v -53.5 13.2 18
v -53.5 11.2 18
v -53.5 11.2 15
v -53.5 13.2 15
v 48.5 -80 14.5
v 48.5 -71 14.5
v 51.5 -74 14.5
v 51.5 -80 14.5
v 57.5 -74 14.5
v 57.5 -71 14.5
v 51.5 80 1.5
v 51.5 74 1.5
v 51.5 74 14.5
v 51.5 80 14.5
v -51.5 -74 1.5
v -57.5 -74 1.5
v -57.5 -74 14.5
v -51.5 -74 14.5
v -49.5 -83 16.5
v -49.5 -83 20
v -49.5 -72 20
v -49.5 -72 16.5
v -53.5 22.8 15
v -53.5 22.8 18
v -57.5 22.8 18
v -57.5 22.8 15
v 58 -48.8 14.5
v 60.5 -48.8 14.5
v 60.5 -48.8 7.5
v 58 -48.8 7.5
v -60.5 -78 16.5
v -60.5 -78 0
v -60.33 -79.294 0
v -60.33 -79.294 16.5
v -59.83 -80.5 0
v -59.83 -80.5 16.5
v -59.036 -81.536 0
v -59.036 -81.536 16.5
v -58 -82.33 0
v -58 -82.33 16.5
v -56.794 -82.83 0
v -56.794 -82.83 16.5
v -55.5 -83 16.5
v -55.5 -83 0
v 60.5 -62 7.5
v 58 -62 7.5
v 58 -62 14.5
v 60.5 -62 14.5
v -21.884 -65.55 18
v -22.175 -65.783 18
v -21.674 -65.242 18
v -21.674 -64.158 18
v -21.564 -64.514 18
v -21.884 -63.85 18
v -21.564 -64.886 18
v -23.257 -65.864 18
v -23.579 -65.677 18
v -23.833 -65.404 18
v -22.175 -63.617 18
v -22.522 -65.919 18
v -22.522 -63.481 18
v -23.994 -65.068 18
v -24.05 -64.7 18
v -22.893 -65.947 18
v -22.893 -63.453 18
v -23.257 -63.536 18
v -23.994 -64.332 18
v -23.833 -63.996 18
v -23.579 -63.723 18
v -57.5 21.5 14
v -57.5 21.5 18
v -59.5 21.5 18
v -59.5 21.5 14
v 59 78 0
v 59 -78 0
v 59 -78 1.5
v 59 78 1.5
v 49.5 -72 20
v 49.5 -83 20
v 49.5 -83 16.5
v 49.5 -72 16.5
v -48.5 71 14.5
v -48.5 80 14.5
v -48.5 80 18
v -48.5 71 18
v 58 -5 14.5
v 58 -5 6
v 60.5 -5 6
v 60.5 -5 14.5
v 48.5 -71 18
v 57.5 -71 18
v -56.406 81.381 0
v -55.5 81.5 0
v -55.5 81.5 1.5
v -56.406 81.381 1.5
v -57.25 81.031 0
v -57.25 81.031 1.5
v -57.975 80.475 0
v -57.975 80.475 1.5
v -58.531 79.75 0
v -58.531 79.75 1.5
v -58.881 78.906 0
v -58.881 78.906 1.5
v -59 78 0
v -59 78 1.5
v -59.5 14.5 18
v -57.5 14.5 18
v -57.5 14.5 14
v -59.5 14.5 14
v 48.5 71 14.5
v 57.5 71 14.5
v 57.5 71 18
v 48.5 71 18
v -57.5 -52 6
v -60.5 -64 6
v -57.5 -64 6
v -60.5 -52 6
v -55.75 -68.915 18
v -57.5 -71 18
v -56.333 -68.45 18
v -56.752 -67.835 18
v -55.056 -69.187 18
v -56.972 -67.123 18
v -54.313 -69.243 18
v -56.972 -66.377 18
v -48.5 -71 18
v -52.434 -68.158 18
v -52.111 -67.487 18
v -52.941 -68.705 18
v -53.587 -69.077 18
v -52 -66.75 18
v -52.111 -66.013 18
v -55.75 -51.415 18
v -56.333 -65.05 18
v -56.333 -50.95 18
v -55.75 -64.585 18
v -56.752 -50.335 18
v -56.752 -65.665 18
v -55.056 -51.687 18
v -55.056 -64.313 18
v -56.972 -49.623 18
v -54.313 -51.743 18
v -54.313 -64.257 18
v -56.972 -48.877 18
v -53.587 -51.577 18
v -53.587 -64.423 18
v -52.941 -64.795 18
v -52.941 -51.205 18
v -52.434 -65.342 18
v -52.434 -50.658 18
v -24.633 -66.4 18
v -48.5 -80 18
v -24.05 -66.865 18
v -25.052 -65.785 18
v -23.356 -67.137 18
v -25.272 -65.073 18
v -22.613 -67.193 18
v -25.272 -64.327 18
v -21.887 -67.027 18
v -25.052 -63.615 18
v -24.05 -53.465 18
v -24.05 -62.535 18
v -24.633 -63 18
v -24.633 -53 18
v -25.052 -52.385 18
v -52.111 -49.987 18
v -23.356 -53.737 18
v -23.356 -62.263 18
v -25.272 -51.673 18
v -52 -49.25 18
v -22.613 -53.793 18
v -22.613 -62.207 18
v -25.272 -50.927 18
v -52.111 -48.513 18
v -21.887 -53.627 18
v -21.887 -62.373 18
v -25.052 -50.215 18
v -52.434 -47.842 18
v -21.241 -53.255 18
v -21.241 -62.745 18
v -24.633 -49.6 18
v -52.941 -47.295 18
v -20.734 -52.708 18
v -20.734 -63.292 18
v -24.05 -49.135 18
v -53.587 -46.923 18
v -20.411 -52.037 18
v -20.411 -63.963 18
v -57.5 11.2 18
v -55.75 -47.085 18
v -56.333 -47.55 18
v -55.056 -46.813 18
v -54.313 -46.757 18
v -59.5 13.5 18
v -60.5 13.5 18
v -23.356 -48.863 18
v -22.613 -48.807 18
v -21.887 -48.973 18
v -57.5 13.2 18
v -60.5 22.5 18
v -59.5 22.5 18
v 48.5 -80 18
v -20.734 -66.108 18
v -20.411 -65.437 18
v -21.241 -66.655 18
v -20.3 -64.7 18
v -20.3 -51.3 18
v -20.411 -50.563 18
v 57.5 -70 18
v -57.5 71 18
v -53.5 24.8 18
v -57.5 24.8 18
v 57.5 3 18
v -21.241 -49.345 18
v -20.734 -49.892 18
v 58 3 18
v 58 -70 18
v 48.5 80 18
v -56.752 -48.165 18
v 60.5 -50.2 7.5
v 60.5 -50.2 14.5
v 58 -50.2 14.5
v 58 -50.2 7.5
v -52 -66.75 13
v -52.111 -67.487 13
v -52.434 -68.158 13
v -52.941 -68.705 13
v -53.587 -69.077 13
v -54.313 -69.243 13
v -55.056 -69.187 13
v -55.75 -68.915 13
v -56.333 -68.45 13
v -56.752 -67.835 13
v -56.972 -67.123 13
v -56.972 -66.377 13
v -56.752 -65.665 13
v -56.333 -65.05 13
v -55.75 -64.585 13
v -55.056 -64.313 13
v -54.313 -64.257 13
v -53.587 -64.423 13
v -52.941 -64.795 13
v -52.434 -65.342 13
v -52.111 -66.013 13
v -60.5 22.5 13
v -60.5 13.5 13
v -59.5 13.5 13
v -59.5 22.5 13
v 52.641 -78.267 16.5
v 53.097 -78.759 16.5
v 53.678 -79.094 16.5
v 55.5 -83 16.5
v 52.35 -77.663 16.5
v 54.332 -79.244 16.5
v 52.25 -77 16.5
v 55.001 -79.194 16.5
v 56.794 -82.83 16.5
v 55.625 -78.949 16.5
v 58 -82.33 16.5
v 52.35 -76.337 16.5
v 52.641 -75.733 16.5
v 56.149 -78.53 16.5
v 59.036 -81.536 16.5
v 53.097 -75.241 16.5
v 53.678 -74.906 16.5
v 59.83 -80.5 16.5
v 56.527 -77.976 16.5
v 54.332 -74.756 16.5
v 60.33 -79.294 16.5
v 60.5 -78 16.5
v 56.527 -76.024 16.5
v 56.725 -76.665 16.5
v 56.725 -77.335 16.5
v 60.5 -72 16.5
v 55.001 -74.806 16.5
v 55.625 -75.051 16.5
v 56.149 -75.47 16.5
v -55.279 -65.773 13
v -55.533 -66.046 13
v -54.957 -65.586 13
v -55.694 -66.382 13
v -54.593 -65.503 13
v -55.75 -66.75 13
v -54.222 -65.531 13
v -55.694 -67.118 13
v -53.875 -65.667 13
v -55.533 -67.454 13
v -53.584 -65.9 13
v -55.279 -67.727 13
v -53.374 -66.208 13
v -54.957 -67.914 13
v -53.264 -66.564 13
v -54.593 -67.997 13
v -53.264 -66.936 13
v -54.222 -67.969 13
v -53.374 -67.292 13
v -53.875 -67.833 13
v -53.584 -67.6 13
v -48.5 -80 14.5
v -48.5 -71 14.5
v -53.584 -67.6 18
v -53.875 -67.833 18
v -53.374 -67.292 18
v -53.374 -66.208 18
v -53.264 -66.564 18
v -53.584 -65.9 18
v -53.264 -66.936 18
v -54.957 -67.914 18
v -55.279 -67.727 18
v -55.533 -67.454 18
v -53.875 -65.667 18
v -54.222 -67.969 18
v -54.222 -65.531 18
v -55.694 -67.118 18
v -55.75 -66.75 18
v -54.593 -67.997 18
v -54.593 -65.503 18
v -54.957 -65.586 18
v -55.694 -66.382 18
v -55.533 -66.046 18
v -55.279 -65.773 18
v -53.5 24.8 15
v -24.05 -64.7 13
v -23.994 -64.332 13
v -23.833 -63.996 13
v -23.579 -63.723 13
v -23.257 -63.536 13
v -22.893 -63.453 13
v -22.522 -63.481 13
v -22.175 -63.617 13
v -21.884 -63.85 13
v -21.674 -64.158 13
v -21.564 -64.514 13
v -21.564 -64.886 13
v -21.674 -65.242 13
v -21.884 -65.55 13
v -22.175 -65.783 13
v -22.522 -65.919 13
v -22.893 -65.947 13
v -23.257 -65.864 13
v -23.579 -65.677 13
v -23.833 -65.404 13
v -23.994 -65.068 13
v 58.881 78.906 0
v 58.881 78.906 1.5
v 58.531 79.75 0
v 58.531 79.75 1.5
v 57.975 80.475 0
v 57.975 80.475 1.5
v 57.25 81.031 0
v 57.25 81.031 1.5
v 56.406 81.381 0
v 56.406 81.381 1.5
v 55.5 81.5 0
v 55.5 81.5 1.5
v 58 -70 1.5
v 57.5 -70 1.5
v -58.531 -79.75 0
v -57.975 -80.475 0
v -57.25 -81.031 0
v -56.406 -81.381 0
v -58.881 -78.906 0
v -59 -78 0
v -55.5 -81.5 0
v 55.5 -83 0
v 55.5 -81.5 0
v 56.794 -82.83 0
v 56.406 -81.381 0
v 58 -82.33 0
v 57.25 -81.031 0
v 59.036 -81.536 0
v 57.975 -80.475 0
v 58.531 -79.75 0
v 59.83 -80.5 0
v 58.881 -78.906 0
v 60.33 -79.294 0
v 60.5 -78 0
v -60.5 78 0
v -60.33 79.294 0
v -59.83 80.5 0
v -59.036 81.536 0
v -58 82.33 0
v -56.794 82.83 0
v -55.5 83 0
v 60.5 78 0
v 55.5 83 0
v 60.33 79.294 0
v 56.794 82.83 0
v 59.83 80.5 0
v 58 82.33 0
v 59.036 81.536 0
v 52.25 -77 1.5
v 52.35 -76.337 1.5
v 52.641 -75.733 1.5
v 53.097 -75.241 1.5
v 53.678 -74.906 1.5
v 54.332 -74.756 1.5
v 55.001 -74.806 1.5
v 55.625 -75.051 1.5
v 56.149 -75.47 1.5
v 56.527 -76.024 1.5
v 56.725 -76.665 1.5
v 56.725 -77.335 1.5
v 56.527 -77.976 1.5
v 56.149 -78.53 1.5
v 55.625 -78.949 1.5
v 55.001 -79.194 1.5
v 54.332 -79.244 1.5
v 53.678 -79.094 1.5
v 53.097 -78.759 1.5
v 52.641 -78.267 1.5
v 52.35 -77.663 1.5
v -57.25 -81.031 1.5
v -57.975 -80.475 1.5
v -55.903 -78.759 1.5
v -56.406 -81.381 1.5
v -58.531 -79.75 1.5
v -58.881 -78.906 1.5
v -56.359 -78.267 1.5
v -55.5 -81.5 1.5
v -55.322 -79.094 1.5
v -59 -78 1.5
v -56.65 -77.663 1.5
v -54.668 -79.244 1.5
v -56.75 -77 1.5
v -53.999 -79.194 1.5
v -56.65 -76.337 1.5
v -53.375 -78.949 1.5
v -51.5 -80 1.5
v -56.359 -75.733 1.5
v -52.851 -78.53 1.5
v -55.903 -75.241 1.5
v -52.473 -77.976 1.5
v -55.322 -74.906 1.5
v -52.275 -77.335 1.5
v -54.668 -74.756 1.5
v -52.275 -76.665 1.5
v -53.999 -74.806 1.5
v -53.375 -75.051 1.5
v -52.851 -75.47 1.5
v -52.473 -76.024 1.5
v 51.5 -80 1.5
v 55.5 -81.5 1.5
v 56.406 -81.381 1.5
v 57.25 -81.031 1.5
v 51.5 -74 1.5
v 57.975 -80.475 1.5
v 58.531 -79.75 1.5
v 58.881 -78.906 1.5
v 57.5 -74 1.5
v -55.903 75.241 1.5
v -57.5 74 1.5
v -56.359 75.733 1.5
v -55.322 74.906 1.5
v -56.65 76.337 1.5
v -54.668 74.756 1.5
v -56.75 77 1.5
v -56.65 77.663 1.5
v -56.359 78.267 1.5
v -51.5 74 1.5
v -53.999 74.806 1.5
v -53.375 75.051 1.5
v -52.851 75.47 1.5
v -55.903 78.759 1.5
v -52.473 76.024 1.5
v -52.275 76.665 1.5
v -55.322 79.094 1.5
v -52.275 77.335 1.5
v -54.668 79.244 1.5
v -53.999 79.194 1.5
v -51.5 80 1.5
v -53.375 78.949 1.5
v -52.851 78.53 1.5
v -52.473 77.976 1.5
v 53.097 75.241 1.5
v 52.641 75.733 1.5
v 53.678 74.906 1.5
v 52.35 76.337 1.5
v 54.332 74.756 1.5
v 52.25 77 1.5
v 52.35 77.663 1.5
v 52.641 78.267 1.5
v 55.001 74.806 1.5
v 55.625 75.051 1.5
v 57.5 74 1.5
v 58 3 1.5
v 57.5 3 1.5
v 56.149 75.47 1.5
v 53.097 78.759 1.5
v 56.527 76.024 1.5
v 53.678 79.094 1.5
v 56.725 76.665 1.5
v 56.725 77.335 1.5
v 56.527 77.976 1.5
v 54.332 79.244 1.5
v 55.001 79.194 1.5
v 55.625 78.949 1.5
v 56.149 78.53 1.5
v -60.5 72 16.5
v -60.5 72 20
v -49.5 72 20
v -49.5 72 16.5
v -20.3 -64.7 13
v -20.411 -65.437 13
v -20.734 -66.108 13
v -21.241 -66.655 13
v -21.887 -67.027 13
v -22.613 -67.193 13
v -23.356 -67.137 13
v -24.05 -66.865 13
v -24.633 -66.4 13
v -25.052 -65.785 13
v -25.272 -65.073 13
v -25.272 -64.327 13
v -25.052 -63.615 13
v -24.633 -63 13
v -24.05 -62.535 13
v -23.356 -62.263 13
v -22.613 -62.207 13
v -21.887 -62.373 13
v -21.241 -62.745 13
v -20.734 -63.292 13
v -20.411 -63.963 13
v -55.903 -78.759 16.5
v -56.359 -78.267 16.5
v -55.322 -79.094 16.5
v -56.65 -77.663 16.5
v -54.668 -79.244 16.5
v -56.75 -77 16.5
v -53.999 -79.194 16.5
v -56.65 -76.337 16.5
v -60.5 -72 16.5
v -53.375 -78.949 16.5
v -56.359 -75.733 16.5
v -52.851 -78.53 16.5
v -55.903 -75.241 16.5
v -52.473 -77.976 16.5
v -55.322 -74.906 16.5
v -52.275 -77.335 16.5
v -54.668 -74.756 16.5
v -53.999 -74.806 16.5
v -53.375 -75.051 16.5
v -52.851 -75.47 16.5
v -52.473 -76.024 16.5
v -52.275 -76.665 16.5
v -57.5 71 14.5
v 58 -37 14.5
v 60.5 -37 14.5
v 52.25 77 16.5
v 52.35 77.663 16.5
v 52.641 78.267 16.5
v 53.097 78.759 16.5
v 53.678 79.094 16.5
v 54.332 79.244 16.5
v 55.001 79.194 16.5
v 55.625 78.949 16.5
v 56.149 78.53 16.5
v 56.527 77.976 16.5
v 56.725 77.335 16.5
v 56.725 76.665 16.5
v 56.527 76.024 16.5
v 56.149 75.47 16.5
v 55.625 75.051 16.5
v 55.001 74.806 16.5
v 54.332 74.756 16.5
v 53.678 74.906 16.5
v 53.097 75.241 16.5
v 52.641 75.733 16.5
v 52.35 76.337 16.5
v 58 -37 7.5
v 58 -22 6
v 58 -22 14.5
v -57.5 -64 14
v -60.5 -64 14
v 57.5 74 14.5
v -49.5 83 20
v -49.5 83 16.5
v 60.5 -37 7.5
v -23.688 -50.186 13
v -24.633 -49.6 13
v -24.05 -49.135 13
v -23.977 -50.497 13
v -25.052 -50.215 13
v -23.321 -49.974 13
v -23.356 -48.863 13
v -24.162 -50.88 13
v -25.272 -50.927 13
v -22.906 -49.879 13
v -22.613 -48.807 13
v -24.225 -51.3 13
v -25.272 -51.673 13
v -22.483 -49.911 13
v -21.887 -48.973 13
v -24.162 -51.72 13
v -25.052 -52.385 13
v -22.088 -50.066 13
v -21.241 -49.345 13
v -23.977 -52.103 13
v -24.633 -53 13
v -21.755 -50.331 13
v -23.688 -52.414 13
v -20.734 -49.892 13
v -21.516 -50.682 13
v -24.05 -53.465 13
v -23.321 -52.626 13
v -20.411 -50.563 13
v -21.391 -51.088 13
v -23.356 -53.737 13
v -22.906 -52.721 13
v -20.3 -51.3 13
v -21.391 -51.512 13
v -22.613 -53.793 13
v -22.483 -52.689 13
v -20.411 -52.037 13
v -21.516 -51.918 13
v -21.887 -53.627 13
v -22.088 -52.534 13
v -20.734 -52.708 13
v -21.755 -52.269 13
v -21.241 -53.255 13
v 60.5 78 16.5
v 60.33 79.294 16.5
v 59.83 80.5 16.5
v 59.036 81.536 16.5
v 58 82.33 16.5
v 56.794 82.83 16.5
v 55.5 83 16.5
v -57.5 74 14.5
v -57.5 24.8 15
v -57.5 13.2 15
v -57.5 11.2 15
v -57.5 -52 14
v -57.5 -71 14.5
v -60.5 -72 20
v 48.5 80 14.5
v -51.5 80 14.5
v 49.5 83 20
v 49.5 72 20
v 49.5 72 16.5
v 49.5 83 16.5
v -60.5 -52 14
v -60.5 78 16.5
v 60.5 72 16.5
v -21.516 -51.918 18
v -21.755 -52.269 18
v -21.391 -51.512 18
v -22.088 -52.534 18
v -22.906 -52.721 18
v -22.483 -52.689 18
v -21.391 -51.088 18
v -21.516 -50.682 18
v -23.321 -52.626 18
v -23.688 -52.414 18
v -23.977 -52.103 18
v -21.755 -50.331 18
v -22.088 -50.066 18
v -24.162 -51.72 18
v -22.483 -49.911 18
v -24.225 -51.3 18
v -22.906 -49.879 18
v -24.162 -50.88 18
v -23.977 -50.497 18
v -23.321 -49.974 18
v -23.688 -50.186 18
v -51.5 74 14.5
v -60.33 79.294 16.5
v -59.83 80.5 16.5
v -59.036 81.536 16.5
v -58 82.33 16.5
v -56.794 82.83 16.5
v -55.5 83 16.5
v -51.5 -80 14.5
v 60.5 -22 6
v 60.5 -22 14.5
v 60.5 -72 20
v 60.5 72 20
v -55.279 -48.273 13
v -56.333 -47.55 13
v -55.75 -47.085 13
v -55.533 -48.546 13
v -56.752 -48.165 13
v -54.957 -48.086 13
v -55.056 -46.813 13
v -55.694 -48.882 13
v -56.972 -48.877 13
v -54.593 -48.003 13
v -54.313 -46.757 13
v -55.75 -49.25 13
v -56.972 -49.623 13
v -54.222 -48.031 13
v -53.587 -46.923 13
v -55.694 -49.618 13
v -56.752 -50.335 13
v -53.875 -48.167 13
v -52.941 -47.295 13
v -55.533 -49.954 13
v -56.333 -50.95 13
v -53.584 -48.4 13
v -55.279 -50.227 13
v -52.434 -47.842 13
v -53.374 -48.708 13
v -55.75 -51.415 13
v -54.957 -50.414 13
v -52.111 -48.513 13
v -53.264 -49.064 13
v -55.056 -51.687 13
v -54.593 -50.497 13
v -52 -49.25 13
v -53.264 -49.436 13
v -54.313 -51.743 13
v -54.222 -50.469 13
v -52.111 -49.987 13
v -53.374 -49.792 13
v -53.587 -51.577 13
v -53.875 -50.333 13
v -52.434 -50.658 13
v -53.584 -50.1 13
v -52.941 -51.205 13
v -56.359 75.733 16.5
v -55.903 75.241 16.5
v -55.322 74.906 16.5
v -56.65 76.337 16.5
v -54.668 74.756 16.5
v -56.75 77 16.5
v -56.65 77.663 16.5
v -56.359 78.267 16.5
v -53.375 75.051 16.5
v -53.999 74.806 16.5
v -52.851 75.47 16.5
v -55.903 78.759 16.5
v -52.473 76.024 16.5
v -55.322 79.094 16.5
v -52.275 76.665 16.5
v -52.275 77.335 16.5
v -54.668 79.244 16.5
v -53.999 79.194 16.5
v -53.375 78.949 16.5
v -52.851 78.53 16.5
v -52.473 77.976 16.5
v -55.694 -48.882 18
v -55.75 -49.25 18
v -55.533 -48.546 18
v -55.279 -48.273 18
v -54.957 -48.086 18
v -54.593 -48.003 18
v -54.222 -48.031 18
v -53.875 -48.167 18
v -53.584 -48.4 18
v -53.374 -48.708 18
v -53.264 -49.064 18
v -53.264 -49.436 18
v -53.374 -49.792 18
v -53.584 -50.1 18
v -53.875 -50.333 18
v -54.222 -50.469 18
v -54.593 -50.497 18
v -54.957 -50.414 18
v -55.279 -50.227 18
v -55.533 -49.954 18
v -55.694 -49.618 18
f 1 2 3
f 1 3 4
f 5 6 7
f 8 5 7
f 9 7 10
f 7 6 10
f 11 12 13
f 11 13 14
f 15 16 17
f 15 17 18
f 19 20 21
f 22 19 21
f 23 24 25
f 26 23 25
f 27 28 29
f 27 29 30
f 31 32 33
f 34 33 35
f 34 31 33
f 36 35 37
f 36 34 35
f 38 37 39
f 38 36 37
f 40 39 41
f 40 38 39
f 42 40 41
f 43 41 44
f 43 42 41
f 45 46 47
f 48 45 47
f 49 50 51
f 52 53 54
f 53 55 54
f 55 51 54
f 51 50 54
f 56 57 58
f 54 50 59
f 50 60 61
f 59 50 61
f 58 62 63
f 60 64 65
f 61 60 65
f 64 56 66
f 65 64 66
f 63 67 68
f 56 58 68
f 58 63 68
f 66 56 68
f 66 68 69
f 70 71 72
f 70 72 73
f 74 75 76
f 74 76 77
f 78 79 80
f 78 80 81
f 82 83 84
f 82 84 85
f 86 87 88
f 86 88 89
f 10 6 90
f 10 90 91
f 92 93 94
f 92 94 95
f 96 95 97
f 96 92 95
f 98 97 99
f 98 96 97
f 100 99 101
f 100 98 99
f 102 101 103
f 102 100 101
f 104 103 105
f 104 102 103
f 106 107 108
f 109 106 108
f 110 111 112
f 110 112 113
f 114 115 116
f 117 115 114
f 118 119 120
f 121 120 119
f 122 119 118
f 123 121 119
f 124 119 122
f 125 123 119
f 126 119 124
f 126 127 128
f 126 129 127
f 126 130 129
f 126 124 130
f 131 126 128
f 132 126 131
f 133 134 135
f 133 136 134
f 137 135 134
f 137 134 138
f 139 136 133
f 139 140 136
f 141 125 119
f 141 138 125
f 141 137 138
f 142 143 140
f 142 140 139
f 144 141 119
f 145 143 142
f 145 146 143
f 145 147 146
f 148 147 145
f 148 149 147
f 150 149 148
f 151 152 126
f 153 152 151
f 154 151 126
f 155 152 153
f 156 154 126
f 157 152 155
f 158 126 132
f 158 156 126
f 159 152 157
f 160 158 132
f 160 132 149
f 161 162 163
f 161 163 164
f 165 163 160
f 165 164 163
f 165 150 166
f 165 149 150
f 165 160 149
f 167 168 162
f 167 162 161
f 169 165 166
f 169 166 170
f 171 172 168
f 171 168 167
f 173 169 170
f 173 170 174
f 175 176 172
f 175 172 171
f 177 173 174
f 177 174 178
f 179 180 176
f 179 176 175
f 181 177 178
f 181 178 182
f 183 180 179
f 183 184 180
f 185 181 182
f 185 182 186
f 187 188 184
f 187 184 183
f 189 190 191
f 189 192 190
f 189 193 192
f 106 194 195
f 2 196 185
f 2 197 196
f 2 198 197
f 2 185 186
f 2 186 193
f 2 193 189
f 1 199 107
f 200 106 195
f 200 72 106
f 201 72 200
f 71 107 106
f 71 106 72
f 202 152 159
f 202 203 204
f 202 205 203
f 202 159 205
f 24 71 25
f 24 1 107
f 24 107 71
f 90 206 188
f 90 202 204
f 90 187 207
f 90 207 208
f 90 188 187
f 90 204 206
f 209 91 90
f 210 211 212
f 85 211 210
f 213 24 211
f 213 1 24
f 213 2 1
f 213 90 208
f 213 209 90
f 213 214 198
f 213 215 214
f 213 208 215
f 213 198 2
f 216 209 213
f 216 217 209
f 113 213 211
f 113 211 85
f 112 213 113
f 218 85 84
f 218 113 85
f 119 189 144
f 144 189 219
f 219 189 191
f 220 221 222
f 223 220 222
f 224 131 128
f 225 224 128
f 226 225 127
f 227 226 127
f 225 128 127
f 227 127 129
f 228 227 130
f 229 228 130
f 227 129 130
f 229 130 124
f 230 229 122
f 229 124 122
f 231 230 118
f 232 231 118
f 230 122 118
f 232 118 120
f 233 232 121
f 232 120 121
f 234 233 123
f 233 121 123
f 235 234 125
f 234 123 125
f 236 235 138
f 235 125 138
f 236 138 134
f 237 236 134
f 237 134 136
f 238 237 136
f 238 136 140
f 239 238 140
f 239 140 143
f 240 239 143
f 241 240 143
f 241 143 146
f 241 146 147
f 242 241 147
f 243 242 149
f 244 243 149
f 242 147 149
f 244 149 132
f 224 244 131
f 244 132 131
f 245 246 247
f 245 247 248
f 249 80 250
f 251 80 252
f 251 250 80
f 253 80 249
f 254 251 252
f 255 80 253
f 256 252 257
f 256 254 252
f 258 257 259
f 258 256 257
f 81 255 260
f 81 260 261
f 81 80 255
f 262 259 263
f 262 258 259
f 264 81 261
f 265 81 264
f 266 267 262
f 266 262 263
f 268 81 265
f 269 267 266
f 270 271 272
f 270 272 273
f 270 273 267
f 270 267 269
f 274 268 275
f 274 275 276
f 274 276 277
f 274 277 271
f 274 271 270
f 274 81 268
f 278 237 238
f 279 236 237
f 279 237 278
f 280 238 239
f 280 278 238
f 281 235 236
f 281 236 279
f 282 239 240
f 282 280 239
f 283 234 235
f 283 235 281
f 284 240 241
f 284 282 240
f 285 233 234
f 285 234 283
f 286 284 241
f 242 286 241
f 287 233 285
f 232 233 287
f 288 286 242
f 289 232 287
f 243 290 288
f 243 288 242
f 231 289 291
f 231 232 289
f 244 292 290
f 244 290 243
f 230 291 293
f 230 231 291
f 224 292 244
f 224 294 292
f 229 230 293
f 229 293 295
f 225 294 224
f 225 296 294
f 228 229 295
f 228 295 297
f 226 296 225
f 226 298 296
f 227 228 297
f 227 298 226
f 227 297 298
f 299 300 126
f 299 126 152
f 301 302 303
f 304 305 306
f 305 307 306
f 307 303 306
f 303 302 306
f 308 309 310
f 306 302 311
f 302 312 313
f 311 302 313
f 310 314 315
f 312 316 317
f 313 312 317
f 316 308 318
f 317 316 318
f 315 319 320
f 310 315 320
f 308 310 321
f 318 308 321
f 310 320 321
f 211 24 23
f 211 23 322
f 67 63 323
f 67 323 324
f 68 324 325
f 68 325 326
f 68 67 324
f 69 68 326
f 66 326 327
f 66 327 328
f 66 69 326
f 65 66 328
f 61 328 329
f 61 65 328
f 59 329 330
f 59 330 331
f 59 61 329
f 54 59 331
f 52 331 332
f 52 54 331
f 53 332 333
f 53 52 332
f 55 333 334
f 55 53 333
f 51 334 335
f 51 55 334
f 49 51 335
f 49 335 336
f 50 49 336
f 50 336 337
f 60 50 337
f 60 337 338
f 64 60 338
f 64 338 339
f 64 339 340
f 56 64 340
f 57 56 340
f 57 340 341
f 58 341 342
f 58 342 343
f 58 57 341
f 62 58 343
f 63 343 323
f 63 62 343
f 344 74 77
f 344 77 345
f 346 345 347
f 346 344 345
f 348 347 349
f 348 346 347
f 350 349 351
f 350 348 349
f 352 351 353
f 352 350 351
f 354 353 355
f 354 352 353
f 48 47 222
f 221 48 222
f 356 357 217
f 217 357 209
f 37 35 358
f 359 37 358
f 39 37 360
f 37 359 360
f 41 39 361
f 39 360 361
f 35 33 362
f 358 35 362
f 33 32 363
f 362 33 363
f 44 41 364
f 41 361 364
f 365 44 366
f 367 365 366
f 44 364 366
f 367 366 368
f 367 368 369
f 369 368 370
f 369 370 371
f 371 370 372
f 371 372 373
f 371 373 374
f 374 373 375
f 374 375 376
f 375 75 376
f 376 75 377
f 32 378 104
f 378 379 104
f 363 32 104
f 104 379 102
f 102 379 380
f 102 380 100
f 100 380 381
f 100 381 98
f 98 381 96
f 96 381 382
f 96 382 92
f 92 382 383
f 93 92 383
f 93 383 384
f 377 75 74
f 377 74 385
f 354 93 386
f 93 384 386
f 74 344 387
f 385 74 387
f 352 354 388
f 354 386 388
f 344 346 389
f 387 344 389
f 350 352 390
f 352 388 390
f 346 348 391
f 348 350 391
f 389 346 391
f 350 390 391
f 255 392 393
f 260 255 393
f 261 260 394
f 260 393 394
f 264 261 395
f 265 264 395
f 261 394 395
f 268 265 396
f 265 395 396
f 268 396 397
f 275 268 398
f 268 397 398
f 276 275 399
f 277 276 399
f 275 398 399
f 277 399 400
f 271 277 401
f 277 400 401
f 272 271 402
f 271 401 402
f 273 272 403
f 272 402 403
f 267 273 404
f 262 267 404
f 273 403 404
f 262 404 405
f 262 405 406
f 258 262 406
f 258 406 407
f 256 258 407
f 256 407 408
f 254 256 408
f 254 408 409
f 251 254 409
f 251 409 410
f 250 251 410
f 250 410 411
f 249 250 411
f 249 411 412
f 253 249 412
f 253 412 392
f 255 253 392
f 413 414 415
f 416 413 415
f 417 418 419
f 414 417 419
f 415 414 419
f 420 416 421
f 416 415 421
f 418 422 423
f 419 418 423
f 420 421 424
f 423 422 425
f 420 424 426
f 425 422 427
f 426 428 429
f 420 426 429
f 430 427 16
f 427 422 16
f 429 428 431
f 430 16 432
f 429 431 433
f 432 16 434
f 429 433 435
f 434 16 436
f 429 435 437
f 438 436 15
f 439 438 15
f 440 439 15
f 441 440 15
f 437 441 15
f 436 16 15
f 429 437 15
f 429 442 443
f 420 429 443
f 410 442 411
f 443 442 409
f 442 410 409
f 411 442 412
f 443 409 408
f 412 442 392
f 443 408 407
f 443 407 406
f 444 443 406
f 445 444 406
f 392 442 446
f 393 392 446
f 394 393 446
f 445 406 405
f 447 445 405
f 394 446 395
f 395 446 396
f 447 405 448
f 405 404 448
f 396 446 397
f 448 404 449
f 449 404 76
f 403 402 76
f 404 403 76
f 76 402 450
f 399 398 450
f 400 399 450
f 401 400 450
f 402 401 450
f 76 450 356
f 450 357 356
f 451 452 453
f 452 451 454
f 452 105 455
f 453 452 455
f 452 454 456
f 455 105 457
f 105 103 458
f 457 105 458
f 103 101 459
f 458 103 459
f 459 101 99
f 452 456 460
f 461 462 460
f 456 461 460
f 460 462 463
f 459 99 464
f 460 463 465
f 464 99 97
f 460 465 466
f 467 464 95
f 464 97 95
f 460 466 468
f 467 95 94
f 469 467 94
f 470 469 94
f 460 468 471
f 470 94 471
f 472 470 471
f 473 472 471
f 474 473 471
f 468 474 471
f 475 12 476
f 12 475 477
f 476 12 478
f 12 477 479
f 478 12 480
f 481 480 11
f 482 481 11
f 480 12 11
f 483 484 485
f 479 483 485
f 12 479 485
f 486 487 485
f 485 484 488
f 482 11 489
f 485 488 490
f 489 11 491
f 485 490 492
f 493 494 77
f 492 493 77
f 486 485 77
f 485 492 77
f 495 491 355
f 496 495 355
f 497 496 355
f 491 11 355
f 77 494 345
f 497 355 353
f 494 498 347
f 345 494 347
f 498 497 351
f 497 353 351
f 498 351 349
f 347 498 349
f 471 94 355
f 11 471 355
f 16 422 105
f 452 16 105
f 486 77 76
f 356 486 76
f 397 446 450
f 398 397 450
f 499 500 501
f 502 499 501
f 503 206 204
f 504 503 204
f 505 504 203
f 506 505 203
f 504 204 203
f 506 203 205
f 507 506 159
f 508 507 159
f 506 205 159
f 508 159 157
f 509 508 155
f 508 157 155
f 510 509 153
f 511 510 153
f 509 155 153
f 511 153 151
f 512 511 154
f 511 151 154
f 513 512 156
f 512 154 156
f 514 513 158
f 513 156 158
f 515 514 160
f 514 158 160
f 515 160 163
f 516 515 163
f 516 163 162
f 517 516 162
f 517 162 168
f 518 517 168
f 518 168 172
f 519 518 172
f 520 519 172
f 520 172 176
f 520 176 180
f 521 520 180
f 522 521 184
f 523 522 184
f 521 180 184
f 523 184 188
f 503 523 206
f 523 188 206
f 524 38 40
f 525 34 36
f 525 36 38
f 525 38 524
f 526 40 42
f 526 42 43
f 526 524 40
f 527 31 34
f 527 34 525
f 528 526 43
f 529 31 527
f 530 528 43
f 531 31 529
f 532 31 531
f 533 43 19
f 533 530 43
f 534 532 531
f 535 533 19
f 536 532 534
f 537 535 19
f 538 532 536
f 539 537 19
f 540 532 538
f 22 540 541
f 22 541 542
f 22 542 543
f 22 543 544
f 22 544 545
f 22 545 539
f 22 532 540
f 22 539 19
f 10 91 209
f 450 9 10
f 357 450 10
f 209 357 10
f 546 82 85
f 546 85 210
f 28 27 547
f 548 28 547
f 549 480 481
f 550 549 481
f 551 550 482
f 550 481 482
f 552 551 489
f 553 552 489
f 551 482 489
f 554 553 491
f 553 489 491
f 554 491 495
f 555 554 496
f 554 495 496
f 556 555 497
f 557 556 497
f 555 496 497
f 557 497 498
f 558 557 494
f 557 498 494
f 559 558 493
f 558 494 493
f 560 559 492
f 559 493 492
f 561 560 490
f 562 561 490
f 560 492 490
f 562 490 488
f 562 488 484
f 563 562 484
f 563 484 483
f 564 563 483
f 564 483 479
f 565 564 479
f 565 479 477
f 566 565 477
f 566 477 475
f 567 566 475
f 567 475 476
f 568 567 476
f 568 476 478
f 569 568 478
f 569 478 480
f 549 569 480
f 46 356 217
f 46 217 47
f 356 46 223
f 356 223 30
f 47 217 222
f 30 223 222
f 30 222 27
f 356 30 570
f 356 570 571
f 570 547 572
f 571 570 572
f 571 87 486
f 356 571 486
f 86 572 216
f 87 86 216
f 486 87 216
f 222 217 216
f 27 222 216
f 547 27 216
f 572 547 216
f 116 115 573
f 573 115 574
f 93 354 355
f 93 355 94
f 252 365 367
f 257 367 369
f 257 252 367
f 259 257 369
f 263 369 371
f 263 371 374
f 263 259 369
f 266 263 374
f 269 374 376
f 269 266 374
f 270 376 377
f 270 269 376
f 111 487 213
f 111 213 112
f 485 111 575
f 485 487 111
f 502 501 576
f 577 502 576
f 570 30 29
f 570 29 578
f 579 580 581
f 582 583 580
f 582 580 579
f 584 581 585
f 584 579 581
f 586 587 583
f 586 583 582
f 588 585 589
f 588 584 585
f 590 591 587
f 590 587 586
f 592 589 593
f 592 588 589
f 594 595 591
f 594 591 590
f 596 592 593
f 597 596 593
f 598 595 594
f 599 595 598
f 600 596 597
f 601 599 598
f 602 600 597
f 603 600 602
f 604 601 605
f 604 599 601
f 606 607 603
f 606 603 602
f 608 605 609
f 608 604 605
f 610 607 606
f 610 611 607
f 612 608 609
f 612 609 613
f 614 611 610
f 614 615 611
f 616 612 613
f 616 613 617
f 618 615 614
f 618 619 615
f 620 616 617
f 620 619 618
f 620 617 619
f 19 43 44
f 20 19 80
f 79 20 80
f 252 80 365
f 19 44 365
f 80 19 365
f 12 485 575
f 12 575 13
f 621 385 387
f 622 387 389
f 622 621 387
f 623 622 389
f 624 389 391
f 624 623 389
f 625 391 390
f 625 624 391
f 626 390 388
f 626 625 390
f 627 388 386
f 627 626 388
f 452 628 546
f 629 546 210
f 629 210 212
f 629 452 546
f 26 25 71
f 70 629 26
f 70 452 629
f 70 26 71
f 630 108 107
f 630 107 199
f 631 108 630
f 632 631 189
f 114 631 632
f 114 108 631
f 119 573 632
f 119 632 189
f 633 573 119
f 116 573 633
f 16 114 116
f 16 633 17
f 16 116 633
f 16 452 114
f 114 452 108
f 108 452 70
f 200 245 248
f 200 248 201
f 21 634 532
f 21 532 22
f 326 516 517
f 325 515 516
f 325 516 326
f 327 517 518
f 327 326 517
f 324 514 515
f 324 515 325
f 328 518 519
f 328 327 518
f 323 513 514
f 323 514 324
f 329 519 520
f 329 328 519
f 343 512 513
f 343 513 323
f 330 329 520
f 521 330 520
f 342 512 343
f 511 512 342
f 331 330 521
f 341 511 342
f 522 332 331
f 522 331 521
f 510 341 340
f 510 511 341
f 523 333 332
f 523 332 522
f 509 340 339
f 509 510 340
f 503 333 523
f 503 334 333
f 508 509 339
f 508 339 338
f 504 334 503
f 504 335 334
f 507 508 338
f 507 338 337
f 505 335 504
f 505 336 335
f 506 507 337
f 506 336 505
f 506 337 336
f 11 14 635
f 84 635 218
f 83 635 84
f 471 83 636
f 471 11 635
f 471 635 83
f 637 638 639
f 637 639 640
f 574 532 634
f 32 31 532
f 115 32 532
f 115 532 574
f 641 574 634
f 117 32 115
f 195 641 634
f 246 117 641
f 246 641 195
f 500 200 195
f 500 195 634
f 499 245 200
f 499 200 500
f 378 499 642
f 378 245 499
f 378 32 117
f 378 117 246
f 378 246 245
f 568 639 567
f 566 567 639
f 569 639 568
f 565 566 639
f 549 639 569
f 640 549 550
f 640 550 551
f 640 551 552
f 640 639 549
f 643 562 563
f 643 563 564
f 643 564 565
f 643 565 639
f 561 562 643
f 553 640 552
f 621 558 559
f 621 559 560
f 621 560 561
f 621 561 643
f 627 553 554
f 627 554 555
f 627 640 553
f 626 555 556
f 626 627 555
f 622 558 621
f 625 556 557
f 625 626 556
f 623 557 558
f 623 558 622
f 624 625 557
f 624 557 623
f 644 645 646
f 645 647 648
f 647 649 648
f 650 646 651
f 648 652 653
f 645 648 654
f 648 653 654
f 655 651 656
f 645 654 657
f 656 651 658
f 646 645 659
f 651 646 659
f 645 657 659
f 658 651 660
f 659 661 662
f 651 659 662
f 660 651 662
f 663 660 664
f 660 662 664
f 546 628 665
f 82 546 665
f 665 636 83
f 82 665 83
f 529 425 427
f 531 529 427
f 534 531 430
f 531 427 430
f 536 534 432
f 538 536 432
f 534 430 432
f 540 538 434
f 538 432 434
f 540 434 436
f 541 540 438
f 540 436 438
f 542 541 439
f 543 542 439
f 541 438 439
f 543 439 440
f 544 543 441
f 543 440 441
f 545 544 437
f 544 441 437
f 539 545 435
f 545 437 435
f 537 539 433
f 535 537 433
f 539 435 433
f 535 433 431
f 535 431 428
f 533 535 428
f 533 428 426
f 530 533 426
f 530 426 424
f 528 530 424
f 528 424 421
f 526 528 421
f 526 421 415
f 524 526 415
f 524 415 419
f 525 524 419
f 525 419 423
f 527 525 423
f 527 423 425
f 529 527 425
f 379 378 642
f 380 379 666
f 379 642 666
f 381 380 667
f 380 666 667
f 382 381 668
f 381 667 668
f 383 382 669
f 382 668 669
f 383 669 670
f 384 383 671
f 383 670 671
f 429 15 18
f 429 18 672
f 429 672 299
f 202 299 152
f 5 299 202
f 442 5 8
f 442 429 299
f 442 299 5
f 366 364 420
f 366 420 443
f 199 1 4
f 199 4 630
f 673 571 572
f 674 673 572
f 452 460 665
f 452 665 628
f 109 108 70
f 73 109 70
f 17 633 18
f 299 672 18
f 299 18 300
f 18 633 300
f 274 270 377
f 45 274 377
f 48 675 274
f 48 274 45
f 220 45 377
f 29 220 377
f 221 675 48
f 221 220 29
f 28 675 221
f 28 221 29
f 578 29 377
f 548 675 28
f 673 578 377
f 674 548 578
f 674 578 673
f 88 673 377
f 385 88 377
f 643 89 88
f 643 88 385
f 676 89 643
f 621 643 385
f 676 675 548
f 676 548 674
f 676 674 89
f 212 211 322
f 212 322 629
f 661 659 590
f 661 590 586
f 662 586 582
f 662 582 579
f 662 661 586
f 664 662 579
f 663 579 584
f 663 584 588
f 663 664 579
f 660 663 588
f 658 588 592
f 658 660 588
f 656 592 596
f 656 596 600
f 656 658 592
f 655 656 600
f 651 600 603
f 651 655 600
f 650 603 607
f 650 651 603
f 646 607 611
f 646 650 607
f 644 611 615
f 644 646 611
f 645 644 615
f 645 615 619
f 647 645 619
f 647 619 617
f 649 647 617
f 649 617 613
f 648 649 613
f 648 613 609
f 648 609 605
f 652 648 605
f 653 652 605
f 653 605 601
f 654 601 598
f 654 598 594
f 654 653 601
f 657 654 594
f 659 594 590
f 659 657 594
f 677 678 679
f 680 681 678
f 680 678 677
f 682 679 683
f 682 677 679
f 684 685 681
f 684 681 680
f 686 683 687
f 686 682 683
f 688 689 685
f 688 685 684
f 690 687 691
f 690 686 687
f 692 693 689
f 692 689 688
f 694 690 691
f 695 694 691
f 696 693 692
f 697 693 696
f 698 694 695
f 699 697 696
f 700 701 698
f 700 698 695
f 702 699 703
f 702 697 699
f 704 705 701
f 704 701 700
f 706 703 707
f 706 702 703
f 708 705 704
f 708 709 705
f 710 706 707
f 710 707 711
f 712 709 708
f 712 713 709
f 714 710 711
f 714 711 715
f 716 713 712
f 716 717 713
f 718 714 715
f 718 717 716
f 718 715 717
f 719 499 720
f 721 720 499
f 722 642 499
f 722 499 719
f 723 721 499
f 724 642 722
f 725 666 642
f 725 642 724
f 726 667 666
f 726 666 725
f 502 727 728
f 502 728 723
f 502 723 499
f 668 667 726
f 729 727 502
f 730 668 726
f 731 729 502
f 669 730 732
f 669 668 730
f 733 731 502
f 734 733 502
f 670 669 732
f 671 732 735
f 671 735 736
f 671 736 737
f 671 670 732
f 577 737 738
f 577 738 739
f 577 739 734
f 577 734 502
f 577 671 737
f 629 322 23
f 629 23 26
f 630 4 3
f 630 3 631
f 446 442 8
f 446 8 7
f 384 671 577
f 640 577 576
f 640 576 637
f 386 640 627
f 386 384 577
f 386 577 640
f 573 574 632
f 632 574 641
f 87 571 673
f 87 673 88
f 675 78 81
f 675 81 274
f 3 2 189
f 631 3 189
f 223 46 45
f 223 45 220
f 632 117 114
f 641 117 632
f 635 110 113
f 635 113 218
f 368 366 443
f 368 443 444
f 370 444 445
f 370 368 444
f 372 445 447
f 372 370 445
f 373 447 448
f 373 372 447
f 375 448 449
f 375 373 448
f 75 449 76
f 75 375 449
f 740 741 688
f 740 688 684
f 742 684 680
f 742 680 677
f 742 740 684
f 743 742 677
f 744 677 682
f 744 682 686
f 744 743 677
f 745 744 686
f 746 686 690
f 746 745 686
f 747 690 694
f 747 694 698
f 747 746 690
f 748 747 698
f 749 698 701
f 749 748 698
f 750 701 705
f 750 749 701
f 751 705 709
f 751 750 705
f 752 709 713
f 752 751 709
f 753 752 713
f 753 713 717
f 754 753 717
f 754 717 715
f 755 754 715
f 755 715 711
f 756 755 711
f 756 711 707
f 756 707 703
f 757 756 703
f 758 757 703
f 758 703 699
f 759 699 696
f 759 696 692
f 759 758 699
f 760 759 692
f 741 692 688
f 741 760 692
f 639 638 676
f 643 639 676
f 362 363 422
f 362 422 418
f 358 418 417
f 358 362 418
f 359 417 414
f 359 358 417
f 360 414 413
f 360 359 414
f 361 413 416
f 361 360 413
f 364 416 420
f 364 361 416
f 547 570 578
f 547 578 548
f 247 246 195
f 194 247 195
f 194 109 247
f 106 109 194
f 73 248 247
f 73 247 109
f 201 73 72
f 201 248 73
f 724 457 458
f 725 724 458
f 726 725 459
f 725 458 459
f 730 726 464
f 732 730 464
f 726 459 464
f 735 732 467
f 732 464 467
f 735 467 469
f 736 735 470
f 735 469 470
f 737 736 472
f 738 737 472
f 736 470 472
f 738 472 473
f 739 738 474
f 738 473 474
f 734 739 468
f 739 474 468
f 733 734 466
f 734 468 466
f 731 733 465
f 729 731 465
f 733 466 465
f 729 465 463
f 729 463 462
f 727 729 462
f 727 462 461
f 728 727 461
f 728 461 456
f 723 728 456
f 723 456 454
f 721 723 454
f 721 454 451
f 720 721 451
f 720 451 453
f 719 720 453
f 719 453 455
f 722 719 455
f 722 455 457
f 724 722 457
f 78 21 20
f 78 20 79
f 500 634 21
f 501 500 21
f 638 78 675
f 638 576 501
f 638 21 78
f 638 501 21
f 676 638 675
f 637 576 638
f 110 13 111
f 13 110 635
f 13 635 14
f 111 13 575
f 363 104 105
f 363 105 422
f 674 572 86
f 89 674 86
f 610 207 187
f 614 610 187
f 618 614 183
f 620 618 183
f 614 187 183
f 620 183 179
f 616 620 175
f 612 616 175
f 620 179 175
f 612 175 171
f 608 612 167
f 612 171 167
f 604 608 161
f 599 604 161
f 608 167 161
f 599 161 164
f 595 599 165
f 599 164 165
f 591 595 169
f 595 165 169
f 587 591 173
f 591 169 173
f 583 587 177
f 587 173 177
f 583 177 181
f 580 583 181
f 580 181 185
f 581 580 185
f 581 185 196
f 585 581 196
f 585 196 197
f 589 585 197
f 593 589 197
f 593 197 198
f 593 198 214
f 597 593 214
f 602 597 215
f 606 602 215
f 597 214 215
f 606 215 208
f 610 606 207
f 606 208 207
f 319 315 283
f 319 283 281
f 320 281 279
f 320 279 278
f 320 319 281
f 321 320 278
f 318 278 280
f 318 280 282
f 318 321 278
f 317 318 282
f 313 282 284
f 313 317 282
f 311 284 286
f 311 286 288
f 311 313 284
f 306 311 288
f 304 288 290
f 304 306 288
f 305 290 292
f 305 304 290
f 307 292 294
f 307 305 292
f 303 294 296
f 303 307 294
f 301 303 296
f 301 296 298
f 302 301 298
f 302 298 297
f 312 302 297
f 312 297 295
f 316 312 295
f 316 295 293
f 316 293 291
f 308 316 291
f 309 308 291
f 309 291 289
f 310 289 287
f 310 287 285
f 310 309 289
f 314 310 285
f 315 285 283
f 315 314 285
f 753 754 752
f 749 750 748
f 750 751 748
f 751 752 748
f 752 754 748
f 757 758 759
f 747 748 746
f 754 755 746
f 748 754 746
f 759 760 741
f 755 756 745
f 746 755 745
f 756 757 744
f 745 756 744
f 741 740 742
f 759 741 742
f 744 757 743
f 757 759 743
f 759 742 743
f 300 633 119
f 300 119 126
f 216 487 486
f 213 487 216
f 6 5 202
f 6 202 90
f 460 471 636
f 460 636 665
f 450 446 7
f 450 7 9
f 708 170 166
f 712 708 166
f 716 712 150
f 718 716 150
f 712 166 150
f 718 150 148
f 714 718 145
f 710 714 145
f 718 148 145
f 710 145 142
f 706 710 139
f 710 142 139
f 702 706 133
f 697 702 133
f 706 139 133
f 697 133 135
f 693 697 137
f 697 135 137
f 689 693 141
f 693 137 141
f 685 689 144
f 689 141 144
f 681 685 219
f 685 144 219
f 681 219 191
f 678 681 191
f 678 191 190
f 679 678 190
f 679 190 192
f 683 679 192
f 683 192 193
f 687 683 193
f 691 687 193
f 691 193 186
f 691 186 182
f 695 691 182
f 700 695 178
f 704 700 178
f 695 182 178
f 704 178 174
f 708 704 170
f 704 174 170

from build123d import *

# Parameters (mm, degrees)
SCHIZZO1_W                   = 121
SCHIZZO1_H                   = 166
ESTRUSIONE_ESTRUSIONE1_DEPTH = 20
RACCORDO1_R                  = 5
TAGLIO_ESTRUSIONE1_DEPTH     = 14.5
SCHIZZO3_R                   = 2.25
TAGLIO_ESTRUSIONE2_DEPTH     = 105.638663982
TAGLIO_ESTRUSIONE3_DEPTH     = 1.5
SCHIZZO5_W                   = 11
SCHIZZO5_H                   = 11
TAGLIO_ESTRUSIONE4_DEPTH     = 3.5
TAGLIO_ESTRUSIONE5_DEPTH     = 3.5
SCHIZZO11_W                  = 8.5
SCHIZZO11_H                  = 17
SCHIZZO11_W_2                = 7
SCHIZZO11_H_2                = 25
TAGLIO_ESTRUSIONE9_DEPTH     = 10
SCHIZZO12_W                  = 16.5
SCHIZZO12_H                  = 73
TAGLIO_ESTRUSIONE10_DEPTH    = 0.5
SCHIZZO13_R                  = 2.5
SCHIZZO13_R_2                = 1.25
SCHIZZO13_R_3                = 1.425
ESTRUSIONE_ESTRUSIONE3_DEPTH = 5
SCHIZZO14_W                  = 8
SCHIZZO14_H                  = 12
TAGLIO_ESTRUSIONE11_DEPTH    = 3
SCHIZZO15_W                  = 4
SCHIZZO15_H                  = 7
TAGLIO_ESTRUSIONE12_DEPTH    = 3
SCHIZZO16_W                  = 4
SCHIZZO16_H                  = 2
ESTRUSIONE_ESTRUSIONE4_DEPTH = 3
SCHIZZO17_W                  = 5
SCHIZZO17_H                  = 9
TAGLIO_ESTRUSIONE13_DEPTH    = 1
SCHIZZO18_W                  = 2.5
SCHIZZO18_H                  = 1.4
ESTRUSIONE_ESTRUSIONE5_DEPTH = 10


with BuildPart() as part:
    # Schizzo1 → Estrusione-Estrusione1 (new body)
    with BuildSketch(Plane.XY):
        Rectangle(SCHIZZO1_W, SCHIZZO1_H)
    extrude(amount=ESTRUSIONE_ESTRUSIONE1_DEPTH)

    # Raccordo1
    raccordo1_edges = [part.edges().sort_by_distance(p)[0] for p in [
        (-60.5, 83, 10),
        (60.5, 83, 10),
        (60.5, -83, 10),
        (-60.5, -83, 10),
    ]]
    fillet(raccordo1_edges, radius=RACCORDO1_R)

    # Schizzo2 → Taglio-Estrusione1 (cut)
    with BuildSketch(Plane(origin=(0, 0, 0), x_dir=(-1, 0, 0), z_dir=(0, 0, -1))):
        Polygon((-51.5, 80), (51.5, 80), (51.5, 74), (57.5, 74), (57.5, -74), (51.5, -74), (51.5, -80), (-51.5, -80), (-51.5, -74), (-57.5, -74), (-57.5, 74), (-51.5, 74), align=None)
    extrude(amount=-TAGLIO_ESTRUSIONE1_DEPTH, mode=Mode.SUBTRACT)

    # Schizzo3 → Taglio-Estrusione2 (cut, through all)
    with BuildSketch(Plane(origin=(0, 0, 0), x_dir=(-1, 0, 0), z_dir=(0, 0, -1))):
        with Locations((-54.5, 77)):
            Circle(SCHIZZO3_R)
        with Locations((54.5, 77)):
            Circle(SCHIZZO3_R)
        with Locations((54.5, -77)):
            Circle(SCHIZZO3_R)
        with Locations((-54.5, -77)):
            Circle(SCHIZZO3_R)
    extrude(amount=-TAGLIO_ESTRUSIONE2_DEPTH, mode=Mode.SUBTRACT)

    # Schizzo4 → Taglio-Estrusione3 (cut)
    with BuildSketch(Plane(origin=(0, 0, 0), x_dir=(-1, 0, 0), z_dir=(0, 0, -1))):
        with BuildLine():
            Line((-55.5, 81.5), (55.5, 81.5))
            ThreePointArc((55.5, 81.5), (57.974873734, 80.474873734), (59, 78))
            Line((59, 78), (59, -78))
            ThreePointArc((59, -78), (57.974873734, -80.474873734), (55.5, -81.5))
            Line((55.5, -81.5), (-55.5, -81.5))
            ThreePointArc((-55.5, -81.5), (-57.974873734, -80.474873734), (-59, -78))
            Line((-59, -78), (-59, 78))
            ThreePointArc((-59, 78), (-57.974873734, 80.474873734), (-55.5, 81.5))
        make_face()
    extrude(amount=-TAGLIO_ESTRUSIONE3_DEPTH, mode=Mode.SUBTRACT)

    # Schizzo5 → Taglio-Estrusione4 (cut)
    with BuildSketch(Plane.XY.offset(20)):
        with Locations((-55, 77.5)):
            Rectangle(SCHIZZO5_W, SCHIZZO5_H)
        with Locations((55, 77.5)):
            Rectangle(SCHIZZO5_W, SCHIZZO5_H)
        with Locations((55, -77.5)):
            Rectangle(SCHIZZO5_W, SCHIZZO5_H)
        with Locations((-55, -77.5)):
            Rectangle(SCHIZZO5_W, SCHIZZO5_H)
    extrude(amount=-TAGLIO_ESTRUSIONE4_DEPTH, mode=Mode.SUBTRACT)

    # Schizzo6 → Taglio-Estrusione5 (cut)
    with BuildSketch(Plane(origin=(0, 0, 14.5), x_dir=(-1, 0, 0), z_dir=(0, 0, -1))):
        Polygon((-57.5, 71), (-48.5, 71), (-48.5, 80), (48.5, 80), (48.5, 71), (57.5, 71), (57.5, -71), (48.5, -71), (48.5, -80), (-48.5, -80), (-48.5, -71), (-57.5, -71), align=None)
    extrude(amount=-TAGLIO_ESTRUSIONE5_DEPTH, mode=Mode.SUBTRACT)

    # Schizzo11 → Taglio-Estrusione9 (cut)
    with BuildSketch(Plane.ZY.offset(-57.5)):
        with Locations((10.25, -13.5)):
            Rectangle(SCHIZZO11_W, SCHIZZO11_H)
        with Locations((11, -49.5)):
            Rectangle(SCHIZZO11_W_2, SCHIZZO11_H_2)
    extrude(amount=-TAGLIO_ESTRUSIONE9_DEPTH, mode=Mode.SUBTRACT)

    # Schizzo12 → Taglio-Estrusione10 (cut)
    with BuildSketch(Plane.ZY.offset(-57.5)):
        with Locations((9.75, -33.5)):
            Rectangle(SCHIZZO12_W, SCHIZZO12_H)
    extrude(amount=-TAGLIO_ESTRUSIONE10_DEPTH, mode=Mode.SUBTRACT)

    # Schizzo13 → Estrusione-Estrusione3 (add)
    # profile 1 of 4: a face of its own
    with BuildSketch(Plane(origin=(0, 0, 18), x_dir=(-1, 0, 0), z_dir=(0, 0, -1))):
        with Locations(Location((54.5, -49.25, 0), (0, 0, 180))):
            Circle(SCHIZZO13_R)
        with Locations((54.5, -49.25)):
            Circle(SCHIZZO13_R_2, mode=Mode.SUBTRACT)
    # profile 2 of 4: a face of its own
    with BuildSketch(Plane(origin=(0, 0, 18), x_dir=(-1, 0, 0), z_dir=(0, 0, -1))):
        with Locations(Location((54.5, -66.75, 0), (0, 0, 180))):
            Circle(SCHIZZO13_R)
        with Locations((54.5, -66.75)):
            Circle(SCHIZZO13_R_2, mode=Mode.SUBTRACT)
    # profile 3 of 4: a face of its own
    with BuildSketch(Plane(origin=(0, 0, 18), x_dir=(-1, 0, 0), z_dir=(0, 0, -1))):
        with Locations(Location((22.8, -64.7, 0), (0, 0, 180))):
            Circle(SCHIZZO13_R)
        with Locations((22.8, -64.7)):
            Circle(SCHIZZO13_R_2, mode=Mode.SUBTRACT)
    # profile 4 of 4: a face of its own
    with BuildSketch(Plane(origin=(0, 0, 18), x_dir=(-1, 0, 0), z_dir=(0, 0, -1))):
        with Locations(Location((22.8, -51.3, 0), (0, 0, 180))):
            Circle(SCHIZZO13_R)
        with Locations((22.8, -51.3)):
            Circle(SCHIZZO13_R_3, mode=Mode.SUBTRACT)
    extrude(amount=ESTRUSIONE_ESTRUSIONE3_DEPTH)

    # Schizzo14 → Taglio-Estrusione11 (cut)
    with BuildSketch(Plane.ZY.offset(60.5)):
        with Locations((10, -58)):
            Rectangle(SCHIZZO14_W, SCHIZZO14_H)
    extrude(amount=-TAGLIO_ESTRUSIONE11_DEPTH, mode=Mode.SUBTRACT)

    # Schizzo15 → Taglio-Estrusione12 (cut)
    with BuildSketch(Plane(origin=(-57.5, 0, 0), x_dir=(0, 0, -1), z_dir=(1, 0, 0))):
        with Locations((-16, 18)):
            Rectangle(SCHIZZO15_W, SCHIZZO15_H)
    extrude(amount=-TAGLIO_ESTRUSIONE12_DEPTH, mode=Mode.SUBTRACT)

    # Schizzo16 → Estrusione-Estrusione4 (add)
    with BuildSketch(Plane(origin=(0, 0, 18), x_dir=(-1, 0, 0), z_dir=(0, 0, -1))):
        with Locations((55.5, 23.8)):
            Rectangle(SCHIZZO16_W, SCHIZZO16_H)
        with Locations((55.5, 12.2)):
            Rectangle(SCHIZZO16_W, SCHIZZO16_H)
    extrude(amount=ESTRUSIONE_ESTRUSIONE4_DEPTH)

    # Schizzo17 → Taglio-Estrusione13 (cut)
    with BuildSketch(Plane.ZY.offset(60.5)):
        with Locations((15.5, 18)):
            Rectangle(SCHIZZO17_W, SCHIZZO17_H)
    extrude(amount=-TAGLIO_ESTRUSIONE13_DEPTH, mode=Mode.SUBTRACT)

    # Schizzo18 → Estrusione-Estrusione5 (add)
    with BuildSketch(Plane(origin=(0, 0, 14.5), x_dir=(-1, 0, 0), z_dir=(0, 0, -1))):
        with Locations((-59.25, -49.5)):
            Rectangle(SCHIZZO18_W, SCHIZZO18_H)
    extrude(amount=ESTRUSIONE_ESTRUSIONE5_DEPTH)


solid = part.part
